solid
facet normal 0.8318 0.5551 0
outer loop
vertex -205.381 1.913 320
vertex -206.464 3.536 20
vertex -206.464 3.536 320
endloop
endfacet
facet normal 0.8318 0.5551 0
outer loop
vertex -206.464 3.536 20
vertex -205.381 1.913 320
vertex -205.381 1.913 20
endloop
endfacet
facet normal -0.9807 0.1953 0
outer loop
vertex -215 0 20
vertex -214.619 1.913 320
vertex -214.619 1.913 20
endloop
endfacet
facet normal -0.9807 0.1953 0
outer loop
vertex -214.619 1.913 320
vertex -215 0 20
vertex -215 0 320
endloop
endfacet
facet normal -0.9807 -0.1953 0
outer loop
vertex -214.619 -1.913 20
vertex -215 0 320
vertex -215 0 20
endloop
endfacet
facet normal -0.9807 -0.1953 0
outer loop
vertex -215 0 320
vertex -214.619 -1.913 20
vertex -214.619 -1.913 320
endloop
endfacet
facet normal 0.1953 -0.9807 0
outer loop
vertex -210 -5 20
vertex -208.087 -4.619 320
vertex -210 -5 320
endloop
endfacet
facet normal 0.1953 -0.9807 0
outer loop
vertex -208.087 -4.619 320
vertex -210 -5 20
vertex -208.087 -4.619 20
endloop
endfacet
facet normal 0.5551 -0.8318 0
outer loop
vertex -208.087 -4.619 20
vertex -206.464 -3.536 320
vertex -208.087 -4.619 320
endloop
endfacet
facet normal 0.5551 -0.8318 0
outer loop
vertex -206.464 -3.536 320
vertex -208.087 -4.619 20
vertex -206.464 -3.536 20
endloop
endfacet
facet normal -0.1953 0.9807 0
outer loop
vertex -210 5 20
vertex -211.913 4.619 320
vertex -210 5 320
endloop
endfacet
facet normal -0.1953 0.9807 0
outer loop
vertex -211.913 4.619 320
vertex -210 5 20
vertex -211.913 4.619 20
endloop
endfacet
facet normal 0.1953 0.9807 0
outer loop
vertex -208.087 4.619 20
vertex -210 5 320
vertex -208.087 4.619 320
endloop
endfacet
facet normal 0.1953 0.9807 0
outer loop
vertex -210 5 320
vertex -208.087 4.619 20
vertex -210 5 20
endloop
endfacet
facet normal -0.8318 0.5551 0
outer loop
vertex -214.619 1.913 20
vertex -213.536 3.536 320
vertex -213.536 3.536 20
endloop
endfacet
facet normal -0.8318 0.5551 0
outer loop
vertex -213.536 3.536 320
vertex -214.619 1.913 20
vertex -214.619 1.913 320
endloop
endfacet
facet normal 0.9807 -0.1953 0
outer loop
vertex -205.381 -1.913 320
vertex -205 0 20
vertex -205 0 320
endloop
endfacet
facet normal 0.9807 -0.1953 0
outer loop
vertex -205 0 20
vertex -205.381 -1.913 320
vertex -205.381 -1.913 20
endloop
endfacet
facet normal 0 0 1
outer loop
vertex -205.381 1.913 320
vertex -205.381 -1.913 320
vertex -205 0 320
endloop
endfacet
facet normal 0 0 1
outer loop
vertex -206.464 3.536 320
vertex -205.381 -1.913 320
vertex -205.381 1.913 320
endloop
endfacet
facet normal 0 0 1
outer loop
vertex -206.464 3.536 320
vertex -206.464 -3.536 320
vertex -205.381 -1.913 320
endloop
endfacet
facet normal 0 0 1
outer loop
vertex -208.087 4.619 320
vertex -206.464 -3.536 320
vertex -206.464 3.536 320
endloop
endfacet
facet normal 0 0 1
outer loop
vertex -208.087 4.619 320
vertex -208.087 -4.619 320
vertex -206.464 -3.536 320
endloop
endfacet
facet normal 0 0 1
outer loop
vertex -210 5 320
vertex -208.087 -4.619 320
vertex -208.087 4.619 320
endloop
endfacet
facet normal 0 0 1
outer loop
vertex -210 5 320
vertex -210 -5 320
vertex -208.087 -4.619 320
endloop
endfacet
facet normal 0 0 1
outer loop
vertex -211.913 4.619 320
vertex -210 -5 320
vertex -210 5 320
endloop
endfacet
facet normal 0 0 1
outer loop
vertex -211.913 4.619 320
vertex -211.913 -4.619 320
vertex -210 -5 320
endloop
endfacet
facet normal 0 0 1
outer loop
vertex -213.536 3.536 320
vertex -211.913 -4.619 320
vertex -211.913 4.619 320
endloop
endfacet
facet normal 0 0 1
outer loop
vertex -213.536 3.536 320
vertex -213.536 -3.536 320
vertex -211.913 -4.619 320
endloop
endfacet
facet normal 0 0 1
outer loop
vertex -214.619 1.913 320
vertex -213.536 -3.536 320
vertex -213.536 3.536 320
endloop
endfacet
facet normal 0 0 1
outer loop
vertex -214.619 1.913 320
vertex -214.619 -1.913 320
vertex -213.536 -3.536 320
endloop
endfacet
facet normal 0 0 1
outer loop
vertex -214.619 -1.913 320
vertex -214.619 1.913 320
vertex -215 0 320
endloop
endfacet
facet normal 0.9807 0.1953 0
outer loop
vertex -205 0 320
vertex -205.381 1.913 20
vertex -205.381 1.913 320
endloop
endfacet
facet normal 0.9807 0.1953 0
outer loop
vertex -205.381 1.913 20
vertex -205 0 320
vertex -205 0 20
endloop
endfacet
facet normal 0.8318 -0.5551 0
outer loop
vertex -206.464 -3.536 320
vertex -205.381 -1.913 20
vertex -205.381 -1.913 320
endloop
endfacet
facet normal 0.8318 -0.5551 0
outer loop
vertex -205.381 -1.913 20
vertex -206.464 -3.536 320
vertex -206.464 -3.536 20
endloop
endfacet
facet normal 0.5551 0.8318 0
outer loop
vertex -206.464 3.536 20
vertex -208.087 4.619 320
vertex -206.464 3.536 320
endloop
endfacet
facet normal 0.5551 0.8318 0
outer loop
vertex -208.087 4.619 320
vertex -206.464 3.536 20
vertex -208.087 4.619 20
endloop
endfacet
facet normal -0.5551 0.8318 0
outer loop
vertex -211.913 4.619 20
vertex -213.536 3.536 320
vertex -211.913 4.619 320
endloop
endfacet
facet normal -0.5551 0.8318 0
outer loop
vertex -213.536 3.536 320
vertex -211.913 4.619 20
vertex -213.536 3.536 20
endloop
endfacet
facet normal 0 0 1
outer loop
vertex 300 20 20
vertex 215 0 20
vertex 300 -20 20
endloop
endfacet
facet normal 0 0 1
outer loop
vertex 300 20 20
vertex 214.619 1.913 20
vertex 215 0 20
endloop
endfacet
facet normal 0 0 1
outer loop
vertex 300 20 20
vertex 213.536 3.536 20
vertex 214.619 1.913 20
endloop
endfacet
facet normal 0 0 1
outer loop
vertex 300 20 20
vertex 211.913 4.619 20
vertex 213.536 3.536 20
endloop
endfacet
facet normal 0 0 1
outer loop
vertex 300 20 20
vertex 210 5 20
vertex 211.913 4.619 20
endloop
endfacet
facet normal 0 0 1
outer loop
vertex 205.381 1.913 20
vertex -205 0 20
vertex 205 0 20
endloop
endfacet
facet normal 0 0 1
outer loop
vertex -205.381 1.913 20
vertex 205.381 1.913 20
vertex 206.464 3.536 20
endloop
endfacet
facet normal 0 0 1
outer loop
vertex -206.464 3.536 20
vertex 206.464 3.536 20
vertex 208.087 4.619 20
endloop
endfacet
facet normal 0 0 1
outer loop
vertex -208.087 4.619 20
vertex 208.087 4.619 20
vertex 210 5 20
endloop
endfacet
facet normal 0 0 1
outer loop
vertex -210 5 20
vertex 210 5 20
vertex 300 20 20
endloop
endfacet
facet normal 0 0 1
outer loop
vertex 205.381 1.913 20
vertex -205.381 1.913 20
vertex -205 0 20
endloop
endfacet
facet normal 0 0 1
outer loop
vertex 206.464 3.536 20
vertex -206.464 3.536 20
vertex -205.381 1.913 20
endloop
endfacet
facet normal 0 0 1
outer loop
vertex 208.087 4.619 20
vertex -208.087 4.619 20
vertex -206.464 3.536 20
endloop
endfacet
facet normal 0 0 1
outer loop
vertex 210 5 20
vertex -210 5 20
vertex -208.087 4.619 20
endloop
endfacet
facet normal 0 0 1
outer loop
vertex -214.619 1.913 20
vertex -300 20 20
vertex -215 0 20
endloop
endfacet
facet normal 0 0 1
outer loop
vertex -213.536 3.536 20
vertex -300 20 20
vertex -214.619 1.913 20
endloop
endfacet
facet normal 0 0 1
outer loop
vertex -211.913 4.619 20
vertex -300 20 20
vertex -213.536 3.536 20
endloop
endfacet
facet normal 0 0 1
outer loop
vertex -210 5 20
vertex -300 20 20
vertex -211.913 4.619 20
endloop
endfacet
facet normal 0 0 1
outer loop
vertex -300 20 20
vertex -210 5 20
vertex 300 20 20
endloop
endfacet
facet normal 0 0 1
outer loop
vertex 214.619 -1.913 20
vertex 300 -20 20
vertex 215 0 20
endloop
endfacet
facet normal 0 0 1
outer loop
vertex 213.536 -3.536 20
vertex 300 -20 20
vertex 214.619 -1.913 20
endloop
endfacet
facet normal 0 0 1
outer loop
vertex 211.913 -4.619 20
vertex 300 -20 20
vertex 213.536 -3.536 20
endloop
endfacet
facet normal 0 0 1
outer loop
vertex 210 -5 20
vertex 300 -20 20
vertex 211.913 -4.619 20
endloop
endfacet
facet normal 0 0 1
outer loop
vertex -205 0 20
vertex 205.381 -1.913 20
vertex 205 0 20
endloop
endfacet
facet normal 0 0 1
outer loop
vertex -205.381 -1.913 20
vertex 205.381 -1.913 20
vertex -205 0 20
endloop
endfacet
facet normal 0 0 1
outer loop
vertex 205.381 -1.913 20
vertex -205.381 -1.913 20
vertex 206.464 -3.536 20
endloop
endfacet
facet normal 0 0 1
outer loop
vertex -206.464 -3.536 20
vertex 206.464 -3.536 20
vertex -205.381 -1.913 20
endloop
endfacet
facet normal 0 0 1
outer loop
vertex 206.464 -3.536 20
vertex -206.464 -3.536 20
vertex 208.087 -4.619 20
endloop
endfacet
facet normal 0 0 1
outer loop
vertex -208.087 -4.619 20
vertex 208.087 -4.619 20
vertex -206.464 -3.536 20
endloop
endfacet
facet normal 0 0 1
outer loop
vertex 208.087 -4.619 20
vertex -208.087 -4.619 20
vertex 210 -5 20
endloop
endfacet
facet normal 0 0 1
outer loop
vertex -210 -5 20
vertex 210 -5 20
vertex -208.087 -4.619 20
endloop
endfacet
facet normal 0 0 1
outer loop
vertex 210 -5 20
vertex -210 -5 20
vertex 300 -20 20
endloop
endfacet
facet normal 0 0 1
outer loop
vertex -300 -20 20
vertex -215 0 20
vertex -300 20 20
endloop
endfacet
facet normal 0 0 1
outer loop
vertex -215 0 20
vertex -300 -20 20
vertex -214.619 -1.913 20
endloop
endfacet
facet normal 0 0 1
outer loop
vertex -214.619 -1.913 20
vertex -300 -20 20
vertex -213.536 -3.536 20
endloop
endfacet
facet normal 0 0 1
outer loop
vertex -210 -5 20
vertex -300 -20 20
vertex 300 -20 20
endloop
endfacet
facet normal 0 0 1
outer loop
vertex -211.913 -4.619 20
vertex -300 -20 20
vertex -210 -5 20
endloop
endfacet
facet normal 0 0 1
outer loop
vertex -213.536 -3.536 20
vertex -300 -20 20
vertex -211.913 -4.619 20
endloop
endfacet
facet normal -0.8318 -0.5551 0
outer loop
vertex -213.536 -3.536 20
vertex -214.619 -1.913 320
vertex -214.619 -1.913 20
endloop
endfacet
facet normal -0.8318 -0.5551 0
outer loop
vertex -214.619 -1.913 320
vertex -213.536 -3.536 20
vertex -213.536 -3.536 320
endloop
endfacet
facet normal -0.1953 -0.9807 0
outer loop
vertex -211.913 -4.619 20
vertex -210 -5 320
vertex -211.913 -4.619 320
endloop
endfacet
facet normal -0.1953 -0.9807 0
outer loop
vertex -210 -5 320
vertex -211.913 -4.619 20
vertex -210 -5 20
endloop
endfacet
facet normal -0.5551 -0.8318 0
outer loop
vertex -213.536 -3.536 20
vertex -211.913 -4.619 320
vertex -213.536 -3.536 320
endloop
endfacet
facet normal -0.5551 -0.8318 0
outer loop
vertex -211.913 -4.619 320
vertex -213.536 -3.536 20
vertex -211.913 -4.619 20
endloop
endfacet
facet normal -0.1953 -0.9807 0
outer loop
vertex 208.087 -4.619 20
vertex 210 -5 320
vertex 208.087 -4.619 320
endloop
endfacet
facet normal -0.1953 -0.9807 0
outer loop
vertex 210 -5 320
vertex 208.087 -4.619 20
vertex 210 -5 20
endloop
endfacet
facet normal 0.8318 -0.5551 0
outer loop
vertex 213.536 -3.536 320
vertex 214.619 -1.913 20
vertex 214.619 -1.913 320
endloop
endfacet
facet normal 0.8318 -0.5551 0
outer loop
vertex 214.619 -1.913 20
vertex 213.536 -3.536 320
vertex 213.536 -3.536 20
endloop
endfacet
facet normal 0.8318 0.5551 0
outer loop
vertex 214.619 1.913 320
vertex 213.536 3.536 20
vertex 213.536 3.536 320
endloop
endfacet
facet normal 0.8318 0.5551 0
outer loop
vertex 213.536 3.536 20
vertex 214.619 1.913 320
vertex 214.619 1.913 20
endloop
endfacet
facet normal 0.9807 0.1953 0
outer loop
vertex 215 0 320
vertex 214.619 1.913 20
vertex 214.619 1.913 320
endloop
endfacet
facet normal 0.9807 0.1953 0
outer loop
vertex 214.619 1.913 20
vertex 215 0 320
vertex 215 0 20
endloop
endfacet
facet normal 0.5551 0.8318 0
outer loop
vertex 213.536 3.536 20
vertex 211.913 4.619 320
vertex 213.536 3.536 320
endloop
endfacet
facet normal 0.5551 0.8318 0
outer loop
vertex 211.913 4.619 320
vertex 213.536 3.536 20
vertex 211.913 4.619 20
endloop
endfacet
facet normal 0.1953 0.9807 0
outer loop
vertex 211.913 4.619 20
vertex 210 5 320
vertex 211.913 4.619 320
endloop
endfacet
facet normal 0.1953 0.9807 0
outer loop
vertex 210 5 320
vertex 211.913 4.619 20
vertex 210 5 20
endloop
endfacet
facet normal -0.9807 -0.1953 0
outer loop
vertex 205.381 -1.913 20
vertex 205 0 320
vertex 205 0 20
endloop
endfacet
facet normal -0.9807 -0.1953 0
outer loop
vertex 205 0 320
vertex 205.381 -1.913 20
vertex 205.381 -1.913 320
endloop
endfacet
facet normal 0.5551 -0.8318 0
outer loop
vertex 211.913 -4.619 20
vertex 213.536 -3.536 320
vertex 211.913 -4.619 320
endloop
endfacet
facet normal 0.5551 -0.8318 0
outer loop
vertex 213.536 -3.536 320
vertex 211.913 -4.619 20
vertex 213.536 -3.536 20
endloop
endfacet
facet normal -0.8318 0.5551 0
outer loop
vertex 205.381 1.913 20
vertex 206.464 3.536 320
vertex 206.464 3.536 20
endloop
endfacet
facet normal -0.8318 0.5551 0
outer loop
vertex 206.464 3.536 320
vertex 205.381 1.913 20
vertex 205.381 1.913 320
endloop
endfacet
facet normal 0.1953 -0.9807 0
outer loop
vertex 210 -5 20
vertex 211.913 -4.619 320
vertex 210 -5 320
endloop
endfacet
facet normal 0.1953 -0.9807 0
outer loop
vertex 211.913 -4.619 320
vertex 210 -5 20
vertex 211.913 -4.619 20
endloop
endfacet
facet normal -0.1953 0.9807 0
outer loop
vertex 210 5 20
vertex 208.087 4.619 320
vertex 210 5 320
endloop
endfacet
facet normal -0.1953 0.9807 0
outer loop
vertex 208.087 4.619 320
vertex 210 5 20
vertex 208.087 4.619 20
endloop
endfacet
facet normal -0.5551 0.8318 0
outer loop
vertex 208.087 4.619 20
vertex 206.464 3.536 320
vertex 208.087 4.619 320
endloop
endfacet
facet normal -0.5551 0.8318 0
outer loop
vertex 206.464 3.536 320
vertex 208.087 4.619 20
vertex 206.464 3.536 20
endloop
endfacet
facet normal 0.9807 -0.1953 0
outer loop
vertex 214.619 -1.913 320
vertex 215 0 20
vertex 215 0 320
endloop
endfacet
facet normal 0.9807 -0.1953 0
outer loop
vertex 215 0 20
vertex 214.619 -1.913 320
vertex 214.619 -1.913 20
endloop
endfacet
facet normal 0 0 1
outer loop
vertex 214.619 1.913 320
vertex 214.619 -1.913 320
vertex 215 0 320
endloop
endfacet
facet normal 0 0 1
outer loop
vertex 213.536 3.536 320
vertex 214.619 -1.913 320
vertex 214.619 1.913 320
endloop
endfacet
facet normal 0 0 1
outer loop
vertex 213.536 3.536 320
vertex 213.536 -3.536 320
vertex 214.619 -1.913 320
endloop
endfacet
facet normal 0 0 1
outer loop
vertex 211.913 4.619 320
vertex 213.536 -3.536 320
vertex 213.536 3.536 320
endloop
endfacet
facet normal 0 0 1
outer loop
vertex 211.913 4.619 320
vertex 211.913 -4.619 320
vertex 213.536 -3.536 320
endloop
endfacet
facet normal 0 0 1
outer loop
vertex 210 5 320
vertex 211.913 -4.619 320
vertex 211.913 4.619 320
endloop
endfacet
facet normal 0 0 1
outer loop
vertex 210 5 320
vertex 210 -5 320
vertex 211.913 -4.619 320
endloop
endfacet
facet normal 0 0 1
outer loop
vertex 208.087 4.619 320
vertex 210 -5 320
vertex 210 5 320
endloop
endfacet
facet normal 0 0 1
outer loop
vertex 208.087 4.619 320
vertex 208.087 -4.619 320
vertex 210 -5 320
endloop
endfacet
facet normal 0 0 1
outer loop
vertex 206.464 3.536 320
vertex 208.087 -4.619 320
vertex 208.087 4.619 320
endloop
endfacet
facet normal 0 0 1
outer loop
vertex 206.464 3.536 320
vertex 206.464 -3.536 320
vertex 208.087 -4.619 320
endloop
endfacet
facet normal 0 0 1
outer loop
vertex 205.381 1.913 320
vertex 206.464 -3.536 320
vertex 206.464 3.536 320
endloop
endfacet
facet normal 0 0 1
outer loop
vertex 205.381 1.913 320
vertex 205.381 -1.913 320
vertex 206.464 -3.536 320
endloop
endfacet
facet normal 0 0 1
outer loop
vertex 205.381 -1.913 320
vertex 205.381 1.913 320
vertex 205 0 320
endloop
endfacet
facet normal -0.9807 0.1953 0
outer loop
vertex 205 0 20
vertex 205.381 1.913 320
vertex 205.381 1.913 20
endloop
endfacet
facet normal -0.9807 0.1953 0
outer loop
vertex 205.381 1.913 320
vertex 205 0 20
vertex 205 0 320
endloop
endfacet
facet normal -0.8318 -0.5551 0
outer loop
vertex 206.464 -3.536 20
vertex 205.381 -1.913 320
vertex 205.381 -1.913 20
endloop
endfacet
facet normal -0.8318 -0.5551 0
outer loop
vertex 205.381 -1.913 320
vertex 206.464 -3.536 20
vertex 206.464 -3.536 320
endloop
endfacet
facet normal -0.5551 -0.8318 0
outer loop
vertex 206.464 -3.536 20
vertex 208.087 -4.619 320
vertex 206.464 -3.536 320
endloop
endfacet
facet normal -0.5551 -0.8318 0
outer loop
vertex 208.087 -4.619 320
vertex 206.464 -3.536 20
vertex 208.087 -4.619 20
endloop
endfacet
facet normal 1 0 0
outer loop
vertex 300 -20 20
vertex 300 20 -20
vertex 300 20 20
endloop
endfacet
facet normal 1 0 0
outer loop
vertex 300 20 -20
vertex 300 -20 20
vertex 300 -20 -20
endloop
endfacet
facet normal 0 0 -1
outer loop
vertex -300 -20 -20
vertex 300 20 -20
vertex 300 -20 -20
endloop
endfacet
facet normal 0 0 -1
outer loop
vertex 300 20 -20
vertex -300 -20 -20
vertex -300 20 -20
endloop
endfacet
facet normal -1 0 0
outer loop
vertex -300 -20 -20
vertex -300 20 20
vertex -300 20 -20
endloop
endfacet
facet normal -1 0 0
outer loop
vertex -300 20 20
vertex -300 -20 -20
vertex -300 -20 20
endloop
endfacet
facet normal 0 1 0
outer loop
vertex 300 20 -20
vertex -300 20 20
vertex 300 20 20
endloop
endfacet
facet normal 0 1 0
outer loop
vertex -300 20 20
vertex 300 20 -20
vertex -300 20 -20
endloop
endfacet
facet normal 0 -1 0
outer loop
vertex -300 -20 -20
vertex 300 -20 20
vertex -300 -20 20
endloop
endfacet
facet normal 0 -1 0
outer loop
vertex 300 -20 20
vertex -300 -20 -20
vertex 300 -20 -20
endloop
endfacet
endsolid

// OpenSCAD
// Trapeze hanger — two rods + unistrut crossbar, carries 2 pipes.
// Pipe-contact at strut top-center.

// @part hanger_trapeze
// @kind hanger
// @category hanger.trapeze
// @display-name "Trapeze Hanger (Unistrut + 2 Rods)"
// @mfg unistrut
// @mfg-pn P1000-Trapeze
// @price-usd 22.00
// @install-minutes 20
// @crew journeyman
// @param strut_l number[300,1800] default=600 label="Strut Length" unit="mm"
// @param rod_l number[150,600] default=300 label="Rod Length" unit="mm"
// @port pipe position=[0,0,0.02] direction=[0,0,1] style=none size_in=2 role=branch

strut_l = 600;
strut_w = 40;
strut_h = 40;
rod_d = 10;
rod_l = 300;
union() {
    // Strut (C-channel approx)
    translate([0, 0, 0])
        cube(size = [strut_l, strut_w, strut_h], center = true);
    // Two rods
    for (sgn = [-1, 1])
        translate([sgn * strut_l * 0.35, 0, rod_l / 2 + strut_h / 2])
            cylinder(h = rod_l, d = rod_d, center = true, $fn = 16);
}
